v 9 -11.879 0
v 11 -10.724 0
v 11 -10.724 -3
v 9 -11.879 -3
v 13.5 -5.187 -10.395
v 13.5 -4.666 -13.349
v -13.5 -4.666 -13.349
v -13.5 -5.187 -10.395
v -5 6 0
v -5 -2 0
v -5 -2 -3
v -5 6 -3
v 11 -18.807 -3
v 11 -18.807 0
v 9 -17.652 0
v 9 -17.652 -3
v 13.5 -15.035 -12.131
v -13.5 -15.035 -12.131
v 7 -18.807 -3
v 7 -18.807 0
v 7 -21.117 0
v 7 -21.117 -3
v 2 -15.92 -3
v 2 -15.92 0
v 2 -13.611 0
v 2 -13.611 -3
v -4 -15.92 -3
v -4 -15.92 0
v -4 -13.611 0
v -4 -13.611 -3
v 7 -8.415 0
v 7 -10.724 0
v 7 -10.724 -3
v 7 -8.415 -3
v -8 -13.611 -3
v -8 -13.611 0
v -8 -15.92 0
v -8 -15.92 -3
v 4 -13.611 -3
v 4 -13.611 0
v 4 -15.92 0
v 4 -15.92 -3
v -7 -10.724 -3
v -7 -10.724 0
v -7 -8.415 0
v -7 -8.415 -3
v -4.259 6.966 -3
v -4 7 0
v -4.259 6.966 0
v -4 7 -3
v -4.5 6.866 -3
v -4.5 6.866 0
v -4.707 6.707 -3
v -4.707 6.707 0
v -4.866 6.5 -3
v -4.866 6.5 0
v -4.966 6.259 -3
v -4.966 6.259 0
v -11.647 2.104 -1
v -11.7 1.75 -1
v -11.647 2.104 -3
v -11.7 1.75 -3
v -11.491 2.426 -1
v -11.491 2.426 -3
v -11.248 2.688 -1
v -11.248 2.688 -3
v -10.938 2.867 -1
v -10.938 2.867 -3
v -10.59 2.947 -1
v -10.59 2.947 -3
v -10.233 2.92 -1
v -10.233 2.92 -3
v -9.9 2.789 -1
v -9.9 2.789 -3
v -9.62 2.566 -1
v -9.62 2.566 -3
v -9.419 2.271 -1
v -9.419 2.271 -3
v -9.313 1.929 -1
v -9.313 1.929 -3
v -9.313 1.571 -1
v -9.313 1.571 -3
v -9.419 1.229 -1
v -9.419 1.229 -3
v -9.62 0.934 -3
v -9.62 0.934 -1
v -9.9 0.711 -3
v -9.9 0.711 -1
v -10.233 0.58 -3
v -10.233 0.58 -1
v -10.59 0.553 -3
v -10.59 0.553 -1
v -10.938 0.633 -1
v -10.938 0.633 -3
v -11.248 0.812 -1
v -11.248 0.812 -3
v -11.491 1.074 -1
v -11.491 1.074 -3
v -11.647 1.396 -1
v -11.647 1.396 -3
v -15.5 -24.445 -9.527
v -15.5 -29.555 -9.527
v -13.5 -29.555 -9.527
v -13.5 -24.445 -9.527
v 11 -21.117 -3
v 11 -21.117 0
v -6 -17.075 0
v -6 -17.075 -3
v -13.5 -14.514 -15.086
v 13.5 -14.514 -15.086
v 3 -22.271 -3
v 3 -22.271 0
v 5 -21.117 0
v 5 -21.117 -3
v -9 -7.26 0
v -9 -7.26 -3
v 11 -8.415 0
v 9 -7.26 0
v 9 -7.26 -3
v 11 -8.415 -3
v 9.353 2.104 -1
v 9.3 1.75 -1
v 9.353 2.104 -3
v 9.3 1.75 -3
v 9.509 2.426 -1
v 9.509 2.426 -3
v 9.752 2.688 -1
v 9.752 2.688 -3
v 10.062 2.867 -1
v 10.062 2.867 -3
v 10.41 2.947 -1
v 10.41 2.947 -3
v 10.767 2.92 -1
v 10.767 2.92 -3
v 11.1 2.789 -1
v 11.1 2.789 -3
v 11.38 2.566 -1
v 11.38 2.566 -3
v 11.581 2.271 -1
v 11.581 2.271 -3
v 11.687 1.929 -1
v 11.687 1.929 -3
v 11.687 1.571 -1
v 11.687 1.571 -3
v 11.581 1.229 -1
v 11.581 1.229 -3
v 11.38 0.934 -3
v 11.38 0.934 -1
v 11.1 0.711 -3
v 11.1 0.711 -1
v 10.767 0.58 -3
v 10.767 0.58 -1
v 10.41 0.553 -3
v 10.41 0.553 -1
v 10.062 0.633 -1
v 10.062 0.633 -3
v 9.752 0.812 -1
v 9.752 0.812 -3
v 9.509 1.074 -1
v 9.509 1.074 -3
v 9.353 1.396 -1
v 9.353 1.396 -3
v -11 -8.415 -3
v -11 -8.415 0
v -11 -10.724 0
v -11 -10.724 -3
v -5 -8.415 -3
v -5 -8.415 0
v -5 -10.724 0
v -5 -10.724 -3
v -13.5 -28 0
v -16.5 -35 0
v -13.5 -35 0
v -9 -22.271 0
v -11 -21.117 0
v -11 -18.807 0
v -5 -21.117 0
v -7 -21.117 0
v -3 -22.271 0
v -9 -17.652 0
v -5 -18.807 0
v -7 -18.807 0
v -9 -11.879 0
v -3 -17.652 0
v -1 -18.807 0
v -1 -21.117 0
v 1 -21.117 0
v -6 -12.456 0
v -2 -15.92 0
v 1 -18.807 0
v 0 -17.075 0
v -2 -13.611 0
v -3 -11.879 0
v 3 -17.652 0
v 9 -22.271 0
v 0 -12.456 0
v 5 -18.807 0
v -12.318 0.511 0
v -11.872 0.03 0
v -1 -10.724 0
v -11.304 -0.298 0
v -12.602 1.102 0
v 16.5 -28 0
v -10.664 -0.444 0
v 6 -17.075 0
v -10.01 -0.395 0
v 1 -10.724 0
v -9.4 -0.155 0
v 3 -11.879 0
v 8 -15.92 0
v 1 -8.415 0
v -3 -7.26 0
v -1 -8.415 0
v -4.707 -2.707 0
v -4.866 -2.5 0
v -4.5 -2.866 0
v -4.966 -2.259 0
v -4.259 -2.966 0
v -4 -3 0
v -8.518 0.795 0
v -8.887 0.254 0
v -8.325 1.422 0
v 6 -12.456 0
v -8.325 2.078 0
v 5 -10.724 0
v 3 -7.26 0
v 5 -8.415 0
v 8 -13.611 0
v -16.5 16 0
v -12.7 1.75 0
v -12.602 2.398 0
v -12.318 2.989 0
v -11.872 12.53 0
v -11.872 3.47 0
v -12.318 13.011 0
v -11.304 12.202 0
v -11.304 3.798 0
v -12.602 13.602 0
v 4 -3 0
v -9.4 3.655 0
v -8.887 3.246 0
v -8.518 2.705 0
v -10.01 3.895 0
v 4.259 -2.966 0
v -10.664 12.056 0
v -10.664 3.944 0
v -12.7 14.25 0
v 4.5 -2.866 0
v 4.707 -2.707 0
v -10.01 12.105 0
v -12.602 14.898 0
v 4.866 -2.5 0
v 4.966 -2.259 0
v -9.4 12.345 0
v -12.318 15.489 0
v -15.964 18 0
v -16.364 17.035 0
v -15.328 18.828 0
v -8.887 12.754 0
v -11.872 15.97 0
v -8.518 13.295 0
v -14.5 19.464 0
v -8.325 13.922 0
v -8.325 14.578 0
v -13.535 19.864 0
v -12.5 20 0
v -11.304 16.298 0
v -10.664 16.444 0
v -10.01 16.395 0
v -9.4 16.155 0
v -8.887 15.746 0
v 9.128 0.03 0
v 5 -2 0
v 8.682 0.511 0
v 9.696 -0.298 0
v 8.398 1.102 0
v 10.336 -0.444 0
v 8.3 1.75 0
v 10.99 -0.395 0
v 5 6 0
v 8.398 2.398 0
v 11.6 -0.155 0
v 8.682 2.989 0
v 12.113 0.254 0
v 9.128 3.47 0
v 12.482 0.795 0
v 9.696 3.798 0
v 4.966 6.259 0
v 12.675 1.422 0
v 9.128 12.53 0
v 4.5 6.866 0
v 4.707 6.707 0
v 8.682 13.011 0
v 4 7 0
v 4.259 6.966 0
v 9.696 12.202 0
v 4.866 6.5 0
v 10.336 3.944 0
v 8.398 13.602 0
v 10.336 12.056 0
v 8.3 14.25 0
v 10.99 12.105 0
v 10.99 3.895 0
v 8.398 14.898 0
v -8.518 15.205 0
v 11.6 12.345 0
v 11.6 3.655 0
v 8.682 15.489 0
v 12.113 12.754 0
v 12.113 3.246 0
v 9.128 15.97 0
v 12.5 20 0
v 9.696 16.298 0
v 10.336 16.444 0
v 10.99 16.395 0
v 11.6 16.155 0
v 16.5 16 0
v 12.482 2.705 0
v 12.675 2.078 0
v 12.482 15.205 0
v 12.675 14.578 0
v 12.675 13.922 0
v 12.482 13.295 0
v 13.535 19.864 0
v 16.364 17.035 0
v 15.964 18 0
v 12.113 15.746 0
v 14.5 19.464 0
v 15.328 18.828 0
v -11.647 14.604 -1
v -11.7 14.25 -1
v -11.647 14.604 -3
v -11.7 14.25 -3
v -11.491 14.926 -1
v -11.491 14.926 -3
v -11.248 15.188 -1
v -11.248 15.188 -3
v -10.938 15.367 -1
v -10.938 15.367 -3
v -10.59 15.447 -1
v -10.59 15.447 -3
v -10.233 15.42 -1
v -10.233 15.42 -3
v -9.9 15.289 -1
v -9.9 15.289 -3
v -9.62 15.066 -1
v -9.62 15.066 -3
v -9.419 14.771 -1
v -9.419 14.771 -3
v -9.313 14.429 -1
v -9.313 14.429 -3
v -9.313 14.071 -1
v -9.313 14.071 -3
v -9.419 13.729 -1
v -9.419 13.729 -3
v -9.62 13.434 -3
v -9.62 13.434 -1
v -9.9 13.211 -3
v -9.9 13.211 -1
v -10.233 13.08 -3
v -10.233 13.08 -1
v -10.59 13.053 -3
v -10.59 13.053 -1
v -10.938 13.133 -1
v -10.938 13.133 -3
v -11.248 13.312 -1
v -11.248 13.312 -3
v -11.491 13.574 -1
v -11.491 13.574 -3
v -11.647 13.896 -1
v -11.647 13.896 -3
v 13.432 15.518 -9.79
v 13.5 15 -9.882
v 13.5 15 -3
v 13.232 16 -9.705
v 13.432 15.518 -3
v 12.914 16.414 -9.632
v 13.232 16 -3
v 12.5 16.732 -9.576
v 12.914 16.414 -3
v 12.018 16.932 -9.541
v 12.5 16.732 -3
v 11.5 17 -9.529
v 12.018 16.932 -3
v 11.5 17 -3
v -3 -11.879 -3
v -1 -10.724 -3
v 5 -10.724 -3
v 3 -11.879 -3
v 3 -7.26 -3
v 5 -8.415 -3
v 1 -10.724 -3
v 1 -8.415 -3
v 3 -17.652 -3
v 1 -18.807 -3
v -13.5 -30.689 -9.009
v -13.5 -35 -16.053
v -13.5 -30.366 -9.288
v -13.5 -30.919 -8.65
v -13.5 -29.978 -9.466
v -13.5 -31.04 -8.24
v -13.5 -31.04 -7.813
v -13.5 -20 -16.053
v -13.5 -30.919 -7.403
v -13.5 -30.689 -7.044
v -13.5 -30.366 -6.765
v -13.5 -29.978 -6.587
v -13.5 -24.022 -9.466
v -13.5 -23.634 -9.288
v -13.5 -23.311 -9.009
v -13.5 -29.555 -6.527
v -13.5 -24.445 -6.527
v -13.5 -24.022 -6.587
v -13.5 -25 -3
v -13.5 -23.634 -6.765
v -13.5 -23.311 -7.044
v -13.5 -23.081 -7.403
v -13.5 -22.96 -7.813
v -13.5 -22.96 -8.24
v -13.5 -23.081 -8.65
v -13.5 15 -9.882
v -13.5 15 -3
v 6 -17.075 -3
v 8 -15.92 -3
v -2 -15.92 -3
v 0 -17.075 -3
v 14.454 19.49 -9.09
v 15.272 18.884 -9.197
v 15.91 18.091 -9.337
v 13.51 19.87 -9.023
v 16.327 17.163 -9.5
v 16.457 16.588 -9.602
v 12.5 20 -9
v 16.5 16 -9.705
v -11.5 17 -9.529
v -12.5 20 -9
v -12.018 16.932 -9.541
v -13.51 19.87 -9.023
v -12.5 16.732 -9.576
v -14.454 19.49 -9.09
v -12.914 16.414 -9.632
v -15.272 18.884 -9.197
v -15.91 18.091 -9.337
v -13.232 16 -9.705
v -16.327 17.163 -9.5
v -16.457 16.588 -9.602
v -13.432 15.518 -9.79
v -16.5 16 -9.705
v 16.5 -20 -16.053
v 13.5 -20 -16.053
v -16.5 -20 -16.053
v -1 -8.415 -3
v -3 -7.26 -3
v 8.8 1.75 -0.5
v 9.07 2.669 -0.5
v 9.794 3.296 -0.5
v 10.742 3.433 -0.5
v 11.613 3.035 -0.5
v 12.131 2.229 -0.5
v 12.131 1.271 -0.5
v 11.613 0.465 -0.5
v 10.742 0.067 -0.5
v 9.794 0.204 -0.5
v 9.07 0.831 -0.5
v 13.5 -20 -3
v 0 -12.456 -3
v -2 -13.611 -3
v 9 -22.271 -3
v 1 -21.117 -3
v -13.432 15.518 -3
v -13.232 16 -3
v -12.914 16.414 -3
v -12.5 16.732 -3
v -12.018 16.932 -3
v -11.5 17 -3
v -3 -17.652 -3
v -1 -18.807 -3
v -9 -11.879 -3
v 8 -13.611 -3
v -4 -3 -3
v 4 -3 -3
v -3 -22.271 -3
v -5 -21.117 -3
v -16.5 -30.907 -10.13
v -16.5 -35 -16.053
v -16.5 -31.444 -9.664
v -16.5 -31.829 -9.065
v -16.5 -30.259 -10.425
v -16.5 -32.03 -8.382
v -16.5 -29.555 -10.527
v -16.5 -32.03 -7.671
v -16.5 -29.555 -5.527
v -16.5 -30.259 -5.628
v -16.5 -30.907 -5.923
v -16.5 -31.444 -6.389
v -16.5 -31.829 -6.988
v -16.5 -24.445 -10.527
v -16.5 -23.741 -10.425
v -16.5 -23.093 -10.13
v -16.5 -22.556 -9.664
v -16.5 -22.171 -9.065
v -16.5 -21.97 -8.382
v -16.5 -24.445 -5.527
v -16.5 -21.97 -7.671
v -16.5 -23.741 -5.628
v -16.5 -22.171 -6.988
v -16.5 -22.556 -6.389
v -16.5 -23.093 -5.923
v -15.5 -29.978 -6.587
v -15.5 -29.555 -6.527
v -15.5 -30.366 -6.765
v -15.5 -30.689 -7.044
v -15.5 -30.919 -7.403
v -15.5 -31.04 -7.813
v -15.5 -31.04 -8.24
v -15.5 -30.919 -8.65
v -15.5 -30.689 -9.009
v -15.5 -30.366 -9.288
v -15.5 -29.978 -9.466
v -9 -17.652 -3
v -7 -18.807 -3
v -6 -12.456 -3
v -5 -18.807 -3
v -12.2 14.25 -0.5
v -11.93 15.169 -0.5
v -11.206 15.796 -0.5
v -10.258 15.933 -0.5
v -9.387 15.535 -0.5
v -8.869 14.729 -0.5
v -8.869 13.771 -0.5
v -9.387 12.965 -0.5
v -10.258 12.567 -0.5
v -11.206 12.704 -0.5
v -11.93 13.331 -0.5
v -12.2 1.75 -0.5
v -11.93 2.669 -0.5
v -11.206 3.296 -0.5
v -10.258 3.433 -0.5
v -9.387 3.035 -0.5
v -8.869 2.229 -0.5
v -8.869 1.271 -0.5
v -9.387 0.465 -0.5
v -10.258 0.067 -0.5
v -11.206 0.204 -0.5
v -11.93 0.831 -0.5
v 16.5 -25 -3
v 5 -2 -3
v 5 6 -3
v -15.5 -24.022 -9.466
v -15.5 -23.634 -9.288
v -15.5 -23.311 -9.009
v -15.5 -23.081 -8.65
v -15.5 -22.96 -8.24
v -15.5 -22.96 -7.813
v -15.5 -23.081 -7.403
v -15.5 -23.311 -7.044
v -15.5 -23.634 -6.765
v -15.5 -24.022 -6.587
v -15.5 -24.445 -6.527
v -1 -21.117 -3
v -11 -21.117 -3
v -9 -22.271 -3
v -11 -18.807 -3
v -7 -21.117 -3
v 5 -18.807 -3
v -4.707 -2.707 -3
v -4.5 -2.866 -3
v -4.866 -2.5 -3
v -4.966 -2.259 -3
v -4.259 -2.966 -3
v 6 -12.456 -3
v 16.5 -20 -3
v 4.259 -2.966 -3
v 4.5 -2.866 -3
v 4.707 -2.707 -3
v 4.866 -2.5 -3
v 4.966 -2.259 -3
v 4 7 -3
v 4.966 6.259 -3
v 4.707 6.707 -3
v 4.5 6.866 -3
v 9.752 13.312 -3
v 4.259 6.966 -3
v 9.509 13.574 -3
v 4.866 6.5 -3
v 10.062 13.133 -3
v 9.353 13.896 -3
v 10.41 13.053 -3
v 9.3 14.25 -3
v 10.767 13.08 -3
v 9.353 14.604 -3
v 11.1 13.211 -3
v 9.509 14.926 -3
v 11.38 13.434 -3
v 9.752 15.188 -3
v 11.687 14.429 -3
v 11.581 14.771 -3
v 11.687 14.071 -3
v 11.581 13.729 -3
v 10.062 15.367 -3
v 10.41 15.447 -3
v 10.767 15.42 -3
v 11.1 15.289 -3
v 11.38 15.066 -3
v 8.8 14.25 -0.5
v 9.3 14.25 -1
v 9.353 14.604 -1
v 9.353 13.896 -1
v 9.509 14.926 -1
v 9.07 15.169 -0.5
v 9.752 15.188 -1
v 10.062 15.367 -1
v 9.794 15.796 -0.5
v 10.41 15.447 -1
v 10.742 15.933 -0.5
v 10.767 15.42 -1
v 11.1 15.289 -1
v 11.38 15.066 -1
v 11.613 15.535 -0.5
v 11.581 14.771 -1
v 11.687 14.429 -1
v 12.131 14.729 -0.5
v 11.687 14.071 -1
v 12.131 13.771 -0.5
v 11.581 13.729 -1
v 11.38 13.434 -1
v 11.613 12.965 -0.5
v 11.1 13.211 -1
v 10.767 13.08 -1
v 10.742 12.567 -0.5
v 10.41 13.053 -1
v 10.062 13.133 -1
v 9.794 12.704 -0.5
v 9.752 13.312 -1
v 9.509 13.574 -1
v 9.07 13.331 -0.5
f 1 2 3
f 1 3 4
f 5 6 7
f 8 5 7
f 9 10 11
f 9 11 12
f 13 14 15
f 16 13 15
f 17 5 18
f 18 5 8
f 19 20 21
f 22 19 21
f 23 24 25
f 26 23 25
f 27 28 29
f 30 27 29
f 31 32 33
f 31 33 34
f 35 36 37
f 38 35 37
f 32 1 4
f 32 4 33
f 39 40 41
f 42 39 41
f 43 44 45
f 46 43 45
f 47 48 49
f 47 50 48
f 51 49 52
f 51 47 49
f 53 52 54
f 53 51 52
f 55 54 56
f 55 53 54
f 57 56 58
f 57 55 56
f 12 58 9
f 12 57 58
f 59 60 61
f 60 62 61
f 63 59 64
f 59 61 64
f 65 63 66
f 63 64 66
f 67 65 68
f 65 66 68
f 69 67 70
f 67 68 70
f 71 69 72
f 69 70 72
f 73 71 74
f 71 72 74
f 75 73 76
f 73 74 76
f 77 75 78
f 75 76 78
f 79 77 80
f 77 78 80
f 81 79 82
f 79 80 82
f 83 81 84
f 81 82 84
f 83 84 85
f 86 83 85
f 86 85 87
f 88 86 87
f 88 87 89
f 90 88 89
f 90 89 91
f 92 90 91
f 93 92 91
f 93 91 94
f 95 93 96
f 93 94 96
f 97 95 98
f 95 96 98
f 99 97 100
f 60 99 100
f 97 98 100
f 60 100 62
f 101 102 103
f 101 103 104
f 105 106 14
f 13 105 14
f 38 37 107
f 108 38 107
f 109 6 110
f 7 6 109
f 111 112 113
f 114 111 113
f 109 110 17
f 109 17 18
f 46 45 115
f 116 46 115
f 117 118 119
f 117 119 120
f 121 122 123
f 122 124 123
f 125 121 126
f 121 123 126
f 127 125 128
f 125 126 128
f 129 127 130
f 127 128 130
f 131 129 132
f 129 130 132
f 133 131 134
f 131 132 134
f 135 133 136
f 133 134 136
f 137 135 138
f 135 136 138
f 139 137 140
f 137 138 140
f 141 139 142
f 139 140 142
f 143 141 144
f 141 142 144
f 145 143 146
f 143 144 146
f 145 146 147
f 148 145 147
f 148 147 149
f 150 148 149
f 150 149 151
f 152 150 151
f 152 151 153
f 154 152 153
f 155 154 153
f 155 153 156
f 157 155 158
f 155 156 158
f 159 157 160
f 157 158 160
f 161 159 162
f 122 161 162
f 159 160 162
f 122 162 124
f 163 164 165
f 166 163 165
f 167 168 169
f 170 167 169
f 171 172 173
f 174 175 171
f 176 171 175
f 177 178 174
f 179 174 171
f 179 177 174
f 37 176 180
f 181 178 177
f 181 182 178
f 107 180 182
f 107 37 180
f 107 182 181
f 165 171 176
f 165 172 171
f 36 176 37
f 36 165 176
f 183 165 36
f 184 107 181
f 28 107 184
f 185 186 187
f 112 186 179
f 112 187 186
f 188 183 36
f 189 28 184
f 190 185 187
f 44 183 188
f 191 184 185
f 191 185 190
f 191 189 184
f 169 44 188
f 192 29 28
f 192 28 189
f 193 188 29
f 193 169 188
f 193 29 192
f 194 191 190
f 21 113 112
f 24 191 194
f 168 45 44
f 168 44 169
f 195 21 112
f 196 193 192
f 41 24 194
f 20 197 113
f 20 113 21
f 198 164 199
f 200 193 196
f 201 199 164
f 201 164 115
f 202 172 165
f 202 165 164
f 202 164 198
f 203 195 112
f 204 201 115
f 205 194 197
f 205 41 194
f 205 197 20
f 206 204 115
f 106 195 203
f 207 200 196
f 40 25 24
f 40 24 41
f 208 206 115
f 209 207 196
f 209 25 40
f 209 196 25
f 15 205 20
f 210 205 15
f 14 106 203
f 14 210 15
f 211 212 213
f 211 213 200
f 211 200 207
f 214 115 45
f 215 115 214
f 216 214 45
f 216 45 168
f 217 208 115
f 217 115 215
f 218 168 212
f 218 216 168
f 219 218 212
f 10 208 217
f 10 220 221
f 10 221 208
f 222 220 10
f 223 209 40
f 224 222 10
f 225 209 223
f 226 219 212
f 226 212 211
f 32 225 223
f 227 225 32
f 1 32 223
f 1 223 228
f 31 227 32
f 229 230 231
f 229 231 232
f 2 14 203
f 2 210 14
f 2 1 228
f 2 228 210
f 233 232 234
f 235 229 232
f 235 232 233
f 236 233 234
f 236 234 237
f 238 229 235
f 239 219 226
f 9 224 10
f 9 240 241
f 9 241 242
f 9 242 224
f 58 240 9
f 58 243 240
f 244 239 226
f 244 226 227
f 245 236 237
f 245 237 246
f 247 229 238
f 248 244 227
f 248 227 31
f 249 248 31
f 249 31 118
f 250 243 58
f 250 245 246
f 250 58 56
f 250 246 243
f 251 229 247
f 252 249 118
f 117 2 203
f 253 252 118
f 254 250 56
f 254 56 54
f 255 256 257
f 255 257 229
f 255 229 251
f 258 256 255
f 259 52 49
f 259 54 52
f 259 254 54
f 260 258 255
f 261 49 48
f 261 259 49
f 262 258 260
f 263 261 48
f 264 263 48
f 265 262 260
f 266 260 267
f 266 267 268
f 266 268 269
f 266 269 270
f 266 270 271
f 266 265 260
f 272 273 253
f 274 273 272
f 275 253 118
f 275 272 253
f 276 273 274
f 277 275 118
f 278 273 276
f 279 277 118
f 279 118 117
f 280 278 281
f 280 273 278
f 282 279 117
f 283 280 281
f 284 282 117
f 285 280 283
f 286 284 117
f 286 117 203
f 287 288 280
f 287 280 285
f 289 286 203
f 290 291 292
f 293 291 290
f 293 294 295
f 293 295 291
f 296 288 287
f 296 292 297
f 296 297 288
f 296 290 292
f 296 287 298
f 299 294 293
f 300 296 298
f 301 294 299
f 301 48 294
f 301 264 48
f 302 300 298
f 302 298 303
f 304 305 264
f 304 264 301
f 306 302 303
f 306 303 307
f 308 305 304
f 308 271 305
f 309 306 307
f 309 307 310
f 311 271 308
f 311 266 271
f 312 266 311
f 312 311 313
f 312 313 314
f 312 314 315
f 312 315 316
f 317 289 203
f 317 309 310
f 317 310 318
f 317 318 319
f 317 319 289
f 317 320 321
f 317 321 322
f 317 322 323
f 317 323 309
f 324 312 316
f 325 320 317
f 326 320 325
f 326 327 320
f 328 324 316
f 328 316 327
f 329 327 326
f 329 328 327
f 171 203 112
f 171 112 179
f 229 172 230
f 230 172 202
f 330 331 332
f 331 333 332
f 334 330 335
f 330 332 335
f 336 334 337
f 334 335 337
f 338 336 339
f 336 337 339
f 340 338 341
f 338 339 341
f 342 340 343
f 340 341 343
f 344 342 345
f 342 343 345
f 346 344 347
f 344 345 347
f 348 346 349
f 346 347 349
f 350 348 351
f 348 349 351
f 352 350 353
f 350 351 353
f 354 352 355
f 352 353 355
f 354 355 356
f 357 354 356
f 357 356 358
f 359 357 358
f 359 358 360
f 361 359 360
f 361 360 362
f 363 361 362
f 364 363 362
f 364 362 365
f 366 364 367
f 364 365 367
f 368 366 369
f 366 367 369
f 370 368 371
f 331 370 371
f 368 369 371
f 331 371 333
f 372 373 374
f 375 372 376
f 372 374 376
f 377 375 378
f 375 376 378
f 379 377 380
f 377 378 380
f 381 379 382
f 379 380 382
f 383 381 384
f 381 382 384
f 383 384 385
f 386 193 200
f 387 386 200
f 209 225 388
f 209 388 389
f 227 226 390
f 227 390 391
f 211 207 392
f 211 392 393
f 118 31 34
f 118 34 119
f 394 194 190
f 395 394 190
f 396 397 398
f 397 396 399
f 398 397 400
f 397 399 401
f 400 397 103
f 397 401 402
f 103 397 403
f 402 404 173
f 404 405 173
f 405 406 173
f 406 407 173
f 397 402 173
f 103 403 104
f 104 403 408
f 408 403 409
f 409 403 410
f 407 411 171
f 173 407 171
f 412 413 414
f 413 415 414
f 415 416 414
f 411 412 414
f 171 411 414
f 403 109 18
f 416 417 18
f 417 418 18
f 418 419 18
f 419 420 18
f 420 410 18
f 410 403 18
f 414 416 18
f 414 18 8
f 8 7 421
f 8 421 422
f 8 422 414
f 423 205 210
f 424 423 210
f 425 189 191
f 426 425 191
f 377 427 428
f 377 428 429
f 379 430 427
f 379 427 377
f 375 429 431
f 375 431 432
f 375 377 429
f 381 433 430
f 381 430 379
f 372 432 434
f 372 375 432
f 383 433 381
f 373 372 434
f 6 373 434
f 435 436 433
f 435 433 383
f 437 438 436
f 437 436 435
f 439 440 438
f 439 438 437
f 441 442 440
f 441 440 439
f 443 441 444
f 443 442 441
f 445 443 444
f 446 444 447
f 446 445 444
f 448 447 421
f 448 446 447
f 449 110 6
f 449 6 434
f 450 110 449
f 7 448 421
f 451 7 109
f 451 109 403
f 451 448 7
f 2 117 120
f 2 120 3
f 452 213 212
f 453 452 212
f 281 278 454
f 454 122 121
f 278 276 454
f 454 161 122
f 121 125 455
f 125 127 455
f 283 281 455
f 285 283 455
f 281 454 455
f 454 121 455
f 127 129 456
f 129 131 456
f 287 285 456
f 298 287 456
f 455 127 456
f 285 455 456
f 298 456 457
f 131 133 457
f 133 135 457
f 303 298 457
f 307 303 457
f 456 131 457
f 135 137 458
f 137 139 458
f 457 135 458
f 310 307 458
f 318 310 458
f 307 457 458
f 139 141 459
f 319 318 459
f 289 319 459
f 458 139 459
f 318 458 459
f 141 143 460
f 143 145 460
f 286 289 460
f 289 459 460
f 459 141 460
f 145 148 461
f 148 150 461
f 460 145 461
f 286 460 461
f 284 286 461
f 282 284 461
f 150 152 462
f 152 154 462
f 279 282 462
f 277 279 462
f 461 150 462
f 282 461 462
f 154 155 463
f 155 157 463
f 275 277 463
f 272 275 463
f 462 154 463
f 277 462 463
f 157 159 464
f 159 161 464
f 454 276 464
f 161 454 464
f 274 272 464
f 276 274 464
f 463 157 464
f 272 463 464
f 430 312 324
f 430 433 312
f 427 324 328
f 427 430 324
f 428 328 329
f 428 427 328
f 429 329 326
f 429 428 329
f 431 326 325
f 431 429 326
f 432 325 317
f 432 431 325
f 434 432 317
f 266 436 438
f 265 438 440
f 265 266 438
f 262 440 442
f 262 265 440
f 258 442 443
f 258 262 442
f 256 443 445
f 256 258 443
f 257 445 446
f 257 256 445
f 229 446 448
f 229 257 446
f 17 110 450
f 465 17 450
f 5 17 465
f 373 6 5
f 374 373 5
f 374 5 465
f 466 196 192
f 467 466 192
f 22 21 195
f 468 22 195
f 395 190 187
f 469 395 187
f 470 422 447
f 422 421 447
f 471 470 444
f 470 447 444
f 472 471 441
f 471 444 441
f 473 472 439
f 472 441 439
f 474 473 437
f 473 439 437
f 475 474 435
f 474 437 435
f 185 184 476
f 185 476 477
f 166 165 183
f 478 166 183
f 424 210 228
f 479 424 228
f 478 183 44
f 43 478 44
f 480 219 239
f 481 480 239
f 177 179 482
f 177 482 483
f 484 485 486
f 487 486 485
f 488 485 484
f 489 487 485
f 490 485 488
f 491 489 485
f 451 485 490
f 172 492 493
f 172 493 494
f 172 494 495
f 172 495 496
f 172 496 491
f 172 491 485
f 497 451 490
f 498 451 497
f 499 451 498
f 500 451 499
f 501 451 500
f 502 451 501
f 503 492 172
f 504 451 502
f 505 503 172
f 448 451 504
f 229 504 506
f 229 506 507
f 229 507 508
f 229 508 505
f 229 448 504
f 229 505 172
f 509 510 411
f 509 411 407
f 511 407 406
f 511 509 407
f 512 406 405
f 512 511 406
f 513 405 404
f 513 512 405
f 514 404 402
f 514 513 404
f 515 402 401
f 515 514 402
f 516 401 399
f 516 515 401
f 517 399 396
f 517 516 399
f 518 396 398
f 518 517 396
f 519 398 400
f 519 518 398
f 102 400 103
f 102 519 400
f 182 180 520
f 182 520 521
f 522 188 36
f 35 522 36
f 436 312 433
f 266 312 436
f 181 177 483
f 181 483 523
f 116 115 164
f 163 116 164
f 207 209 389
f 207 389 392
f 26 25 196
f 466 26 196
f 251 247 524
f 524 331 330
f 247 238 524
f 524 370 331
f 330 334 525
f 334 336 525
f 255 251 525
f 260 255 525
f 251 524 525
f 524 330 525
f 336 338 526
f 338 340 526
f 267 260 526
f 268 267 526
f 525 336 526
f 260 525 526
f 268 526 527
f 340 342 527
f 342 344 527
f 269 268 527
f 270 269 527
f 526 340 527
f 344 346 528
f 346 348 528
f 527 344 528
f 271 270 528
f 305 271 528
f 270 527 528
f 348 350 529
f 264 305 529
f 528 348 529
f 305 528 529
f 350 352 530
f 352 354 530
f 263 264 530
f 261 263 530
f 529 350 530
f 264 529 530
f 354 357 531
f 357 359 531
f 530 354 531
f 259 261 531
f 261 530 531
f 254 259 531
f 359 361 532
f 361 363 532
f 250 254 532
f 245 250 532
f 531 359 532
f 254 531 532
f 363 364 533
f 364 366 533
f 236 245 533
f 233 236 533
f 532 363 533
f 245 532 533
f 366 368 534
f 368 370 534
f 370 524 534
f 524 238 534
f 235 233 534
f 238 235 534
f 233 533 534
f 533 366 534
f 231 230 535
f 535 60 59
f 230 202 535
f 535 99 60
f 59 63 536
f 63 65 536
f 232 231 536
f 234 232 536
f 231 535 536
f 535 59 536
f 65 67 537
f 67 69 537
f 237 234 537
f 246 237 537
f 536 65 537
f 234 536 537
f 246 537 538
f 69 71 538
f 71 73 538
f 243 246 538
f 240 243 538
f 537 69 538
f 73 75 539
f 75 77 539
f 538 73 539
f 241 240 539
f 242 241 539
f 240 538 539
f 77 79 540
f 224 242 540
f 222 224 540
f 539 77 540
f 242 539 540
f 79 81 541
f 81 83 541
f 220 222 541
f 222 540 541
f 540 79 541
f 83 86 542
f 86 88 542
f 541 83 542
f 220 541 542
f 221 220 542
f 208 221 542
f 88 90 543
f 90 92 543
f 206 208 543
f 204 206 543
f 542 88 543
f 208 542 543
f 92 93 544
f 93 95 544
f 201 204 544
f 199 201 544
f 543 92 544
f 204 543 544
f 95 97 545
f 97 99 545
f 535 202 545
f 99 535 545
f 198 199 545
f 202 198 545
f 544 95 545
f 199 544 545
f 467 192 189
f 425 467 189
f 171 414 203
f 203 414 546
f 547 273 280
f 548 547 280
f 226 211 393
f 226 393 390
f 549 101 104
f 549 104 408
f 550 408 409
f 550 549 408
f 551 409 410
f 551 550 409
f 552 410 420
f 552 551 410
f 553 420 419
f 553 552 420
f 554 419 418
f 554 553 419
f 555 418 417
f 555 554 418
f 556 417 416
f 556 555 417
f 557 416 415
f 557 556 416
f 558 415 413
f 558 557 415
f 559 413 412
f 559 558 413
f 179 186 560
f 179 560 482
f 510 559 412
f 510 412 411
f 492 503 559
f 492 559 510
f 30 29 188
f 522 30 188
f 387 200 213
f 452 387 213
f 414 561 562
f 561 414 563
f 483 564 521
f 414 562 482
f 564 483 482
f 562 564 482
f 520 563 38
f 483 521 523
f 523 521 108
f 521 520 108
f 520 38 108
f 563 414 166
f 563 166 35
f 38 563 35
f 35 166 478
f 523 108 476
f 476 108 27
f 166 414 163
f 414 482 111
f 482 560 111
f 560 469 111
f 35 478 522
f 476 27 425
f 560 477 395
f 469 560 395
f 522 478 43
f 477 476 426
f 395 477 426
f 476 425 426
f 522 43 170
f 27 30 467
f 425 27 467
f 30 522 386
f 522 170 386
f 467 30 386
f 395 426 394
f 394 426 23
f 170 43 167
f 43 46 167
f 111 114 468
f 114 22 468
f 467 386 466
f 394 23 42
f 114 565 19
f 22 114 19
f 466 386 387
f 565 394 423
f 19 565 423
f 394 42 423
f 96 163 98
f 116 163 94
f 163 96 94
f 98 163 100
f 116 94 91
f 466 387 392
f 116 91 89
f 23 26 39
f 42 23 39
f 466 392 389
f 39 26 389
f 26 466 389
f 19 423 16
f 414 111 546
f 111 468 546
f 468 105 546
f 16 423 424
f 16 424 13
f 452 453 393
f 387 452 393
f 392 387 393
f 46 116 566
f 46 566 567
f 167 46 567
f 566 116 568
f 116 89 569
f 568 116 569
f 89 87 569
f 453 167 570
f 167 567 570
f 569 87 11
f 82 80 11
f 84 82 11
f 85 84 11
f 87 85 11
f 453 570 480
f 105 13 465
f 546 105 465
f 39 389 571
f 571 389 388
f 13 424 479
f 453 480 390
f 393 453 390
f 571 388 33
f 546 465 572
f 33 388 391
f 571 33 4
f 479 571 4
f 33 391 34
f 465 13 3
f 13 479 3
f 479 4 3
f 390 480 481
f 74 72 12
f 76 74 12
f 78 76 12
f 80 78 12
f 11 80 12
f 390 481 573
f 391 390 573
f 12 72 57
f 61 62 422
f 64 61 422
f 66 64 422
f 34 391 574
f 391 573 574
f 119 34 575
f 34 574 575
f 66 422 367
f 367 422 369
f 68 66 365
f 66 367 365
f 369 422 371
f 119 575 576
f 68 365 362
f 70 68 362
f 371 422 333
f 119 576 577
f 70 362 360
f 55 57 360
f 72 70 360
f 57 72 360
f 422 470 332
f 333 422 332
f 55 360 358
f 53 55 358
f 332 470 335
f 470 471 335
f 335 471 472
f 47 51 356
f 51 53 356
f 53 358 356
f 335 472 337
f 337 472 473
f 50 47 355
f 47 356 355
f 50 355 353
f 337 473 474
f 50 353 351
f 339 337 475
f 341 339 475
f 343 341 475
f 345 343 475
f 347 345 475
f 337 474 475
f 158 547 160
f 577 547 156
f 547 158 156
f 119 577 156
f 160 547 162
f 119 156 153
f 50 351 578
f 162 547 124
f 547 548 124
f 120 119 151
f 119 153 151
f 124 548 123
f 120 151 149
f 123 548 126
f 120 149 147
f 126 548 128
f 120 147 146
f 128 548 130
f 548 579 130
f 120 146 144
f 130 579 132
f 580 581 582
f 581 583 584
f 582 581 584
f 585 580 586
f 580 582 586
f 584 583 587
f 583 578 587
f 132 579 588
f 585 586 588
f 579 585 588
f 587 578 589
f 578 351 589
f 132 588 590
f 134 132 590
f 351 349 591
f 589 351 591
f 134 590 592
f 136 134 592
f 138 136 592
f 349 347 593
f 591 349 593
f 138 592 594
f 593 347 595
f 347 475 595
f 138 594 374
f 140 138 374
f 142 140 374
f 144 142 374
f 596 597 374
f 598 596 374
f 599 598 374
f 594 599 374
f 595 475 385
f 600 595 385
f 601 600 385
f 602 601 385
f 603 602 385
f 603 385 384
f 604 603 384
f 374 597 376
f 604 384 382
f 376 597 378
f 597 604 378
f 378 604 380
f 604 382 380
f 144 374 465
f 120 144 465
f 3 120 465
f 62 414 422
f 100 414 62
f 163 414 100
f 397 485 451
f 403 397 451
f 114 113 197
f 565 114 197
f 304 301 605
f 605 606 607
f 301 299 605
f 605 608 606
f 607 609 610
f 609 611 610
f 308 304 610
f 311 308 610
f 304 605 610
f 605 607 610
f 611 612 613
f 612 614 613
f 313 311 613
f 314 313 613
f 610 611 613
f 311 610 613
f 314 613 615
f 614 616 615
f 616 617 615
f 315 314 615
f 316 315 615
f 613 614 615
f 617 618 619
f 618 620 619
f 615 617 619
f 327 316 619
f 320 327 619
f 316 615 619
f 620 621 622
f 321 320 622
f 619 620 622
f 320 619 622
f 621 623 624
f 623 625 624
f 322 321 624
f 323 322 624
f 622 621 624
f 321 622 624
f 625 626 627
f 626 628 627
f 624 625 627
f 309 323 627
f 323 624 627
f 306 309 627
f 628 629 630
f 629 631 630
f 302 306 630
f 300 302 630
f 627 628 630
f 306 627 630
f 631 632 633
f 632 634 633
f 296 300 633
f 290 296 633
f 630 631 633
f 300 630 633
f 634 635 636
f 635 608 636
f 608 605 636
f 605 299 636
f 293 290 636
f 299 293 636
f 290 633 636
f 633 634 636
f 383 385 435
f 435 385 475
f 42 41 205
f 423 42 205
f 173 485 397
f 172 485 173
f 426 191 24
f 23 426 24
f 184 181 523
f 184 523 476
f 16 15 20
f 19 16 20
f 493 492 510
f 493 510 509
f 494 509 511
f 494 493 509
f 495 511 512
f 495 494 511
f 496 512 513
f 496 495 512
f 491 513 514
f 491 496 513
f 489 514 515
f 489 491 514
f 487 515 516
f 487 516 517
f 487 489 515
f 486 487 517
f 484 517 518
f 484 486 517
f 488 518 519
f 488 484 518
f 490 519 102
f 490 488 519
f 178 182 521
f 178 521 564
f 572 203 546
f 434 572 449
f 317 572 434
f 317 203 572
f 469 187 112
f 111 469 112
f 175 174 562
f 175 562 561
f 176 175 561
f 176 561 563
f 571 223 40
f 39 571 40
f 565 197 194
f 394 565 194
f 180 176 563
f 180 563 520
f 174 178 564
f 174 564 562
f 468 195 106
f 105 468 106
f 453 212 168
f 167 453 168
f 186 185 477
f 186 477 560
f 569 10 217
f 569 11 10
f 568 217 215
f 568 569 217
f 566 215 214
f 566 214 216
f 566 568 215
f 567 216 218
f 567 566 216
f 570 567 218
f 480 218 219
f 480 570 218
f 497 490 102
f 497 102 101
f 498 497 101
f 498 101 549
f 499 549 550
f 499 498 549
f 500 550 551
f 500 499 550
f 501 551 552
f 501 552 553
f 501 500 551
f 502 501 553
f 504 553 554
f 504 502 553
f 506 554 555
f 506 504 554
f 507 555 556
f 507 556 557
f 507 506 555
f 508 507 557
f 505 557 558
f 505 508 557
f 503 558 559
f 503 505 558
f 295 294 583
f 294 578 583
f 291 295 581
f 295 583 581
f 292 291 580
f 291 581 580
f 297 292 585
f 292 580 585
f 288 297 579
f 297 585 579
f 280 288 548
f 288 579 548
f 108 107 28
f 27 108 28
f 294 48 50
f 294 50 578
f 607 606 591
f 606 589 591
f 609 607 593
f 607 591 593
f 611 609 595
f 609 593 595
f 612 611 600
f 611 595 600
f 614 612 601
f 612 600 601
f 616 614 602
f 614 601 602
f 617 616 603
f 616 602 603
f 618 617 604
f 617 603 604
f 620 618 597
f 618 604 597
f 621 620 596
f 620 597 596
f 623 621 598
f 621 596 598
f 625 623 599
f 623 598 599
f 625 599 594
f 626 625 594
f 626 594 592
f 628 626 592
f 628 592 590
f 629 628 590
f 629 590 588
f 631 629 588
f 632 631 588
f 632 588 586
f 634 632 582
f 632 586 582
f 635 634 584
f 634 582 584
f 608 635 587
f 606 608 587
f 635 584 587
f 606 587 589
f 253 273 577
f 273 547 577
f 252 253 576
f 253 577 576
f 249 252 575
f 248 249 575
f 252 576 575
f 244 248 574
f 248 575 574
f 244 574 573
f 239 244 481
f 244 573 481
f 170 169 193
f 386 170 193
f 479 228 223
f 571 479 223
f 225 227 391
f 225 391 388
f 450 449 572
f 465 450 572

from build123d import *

# Parameters (mm, degrees)
SKETCH1_W                                       = 33
SKETCH1_H                                       = 40
BOSS_EXTRUDE1_DEPTH                             = 3
SKETCH2_W                                       = 33
SKETCH2_H                                       = 40
SKETCH2_W_2                                     = 27
SKETCH2_H_2                                     = 34
BOSS_EXTRUDE2_DEPTH                             = 3
SKETCH3_W                                       = 10
SKETCH3_H                                       = 10
CUT_EXTRUDE1_DEPTH                              = 3
CSK_FOR_M2_FLAT_HEAD_MACHINE_SCREW1_D           = 2.4
CSK_FOR_M2_FLAT_HEAD_MACHINE_SCREW1_DEPTH       = 5
CSK_FOR_M2_FLAT_HEAD_MACHINE_SCREW1_CSINK_D     = 4.4
CSK_FOR_M2_FLAT_HEAD_MACHINE_SCREW1_CSINK_ANGLE = 90
CSK_FOR_M2_FLAT_HEAD_MACHINE_SCREW1_TIP         = 0.721032743
BOSS_EXTRUDE4_DEPTH                             = 3
FILLET1_R                                       = 1
BOSS_EXTRUDE5_REACH                             = 29.809
SKETCH15_W                                      = 27
SKETCH15_H                                      = 3
SKETCH16_W                                      = 27
SKETCH16_H                                      = 3
CUT_EXTRUDE6_DEPTH                              = 3
SKETCH18_W                                      = 27
SKETCH18_H                                      = 10
BOSS_EXTRUDE6_DEPTH                             = 3
FILLET2_R                                       = 4
FILLET3_R                                       = 2
SKETCH21_W                                      = 16.053079228
SKETCH21_H                                      = 15
BOSS_EXTRUDE7_DEPTH                             = 3
CUT_EXTRUDE10_DEPTH                             = 10
SKETCH23_W                                      = 30
SKETCH23_H                                      = 8
BOSS_EXTRUDE8_DEPTH                             = 3
CHAMFER5_SIZE                                   = 3
CHAMFER6_SIZE                                   = 1
CUT_EXTRUDE12_DEPTH                             = 10


with BuildPart() as part:
    # Sketch1 → Boss-Extrude1 (new body)
    with BuildSketch(Plane.XY):
        Rectangle(SKETCH1_W, SKETCH1_H)
    extrude(amount=-BOSS_EXTRUDE1_DEPTH)

    # Sketch2 → Boss-Extrude2 (add)
    with BuildSketch(Plane(origin=(0, 0, -3), x_dir=(-1, 0, 0), z_dir=(0, 0, -1))):
        Rectangle(SKETCH2_W, SKETCH2_H)
        Rectangle(SKETCH2_W_2, SKETCH2_H_2, mode=Mode.SUBTRACT)
    extrude(amount=BOSS_EXTRUDE2_DEPTH)

    # Sketch3 → Cut-Extrude1 (cut)
    with BuildSketch(Plane.XY):
        with Locations((0, 2)):
            Rectangle(SKETCH3_W, SKETCH3_H)
    extrude(amount=-CUT_EXTRUDE1_DEPTH, mode=Mode.SUBTRACT)

    # CSK for M2 Flat Head Machine Screw1
    with Locations(Plane.XY):
        with Locations((10.5, 1.75), (10.5, 14.25), (-10.5, 1.75), (-10.5, 14.25)):
            CounterSinkHole(CSK_FOR_M2_FLAT_HEAD_MACHINE_SCREW1_D / 2, CSK_FOR_M2_FLAT_HEAD_MACHINE_SCREW1_CSINK_D / 2, depth=CSK_FOR_M2_FLAT_HEAD_MACHINE_SCREW1_DEPTH, counter_sink_angle=CSK_FOR_M2_FLAT_HEAD_MACHINE_SCREW1_CSINK_ANGLE)
            with Locations((0, 0, -(CSK_FOR_M2_FLAT_HEAD_MACHINE_SCREW1_DEPTH + CSK_FOR_M2_FLAT_HEAD_MACHINE_SCREW1_TIP / 2))):  # 118° drill point
                Cone(0, CSK_FOR_M2_FLAT_HEAD_MACHINE_SCREW1_D / 2, CSK_FOR_M2_FLAT_HEAD_MACHINE_SCREW1_TIP, mode=Mode.SUBTRACT)

    # Sketch11 → Boss-Extrude4 (add)
    with BuildSketch(Plane.ZY.offset(16.5)):
        Polygon((-6, 20), (-9, 20), (-16.053079228, -20), (-6, -20), align=None)
    boss_extrude4 = extrude(amount=-BOSS_EXTRUDE4_DEPTH)

    # Mirror1: Boss-Extrude4 across plane
    add(boss_extrude4.mirror(Plane(origin=(0, 0, 0), x_dir=(0, 0, 1), z_dir=(1, 0, 0))))

    # Fillet1
    fillet1_edges = [part.edges().sort_by_distance(p)[0] for p in [
        (5, 7, -1.5),
        (5, -3, -1.5),
        (-5, -3, -1.5),
        (-5, 7, -1.5),
    ]]
    fillet(fillet1_edges, radius=FILLET1_R)

    # Boss-Extrude5: up to this face of the body (flat: up to its plane)
    boss_extrude5_end = Plane(part.part.faces().sort_by_distance((15, 0, -12.526539614))[0])
    # Sketch15 → Boss-Extrude5 (add, up to the picked face)
    with BuildSketch(Plane(origin=(0, 0, -6), x_dir=(-1, 0, 0), z_dir=(0, 0, -1)), mode=Mode.PRIVATE) as boss_extrude5_sk1:
        with Locations((0, 18.5)):
            Rectangle(SKETCH15_W, SKETCH15_H)
    boss_extrude5_tool1 = split(extrude(boss_extrude5_sk1.sketch, amount=BOSS_EXTRUDE5_REACH, mode=Mode.PRIVATE), bisect_by=boss_extrude5_end, keep=Keep.BOTH, mode=Mode.PRIVATE)
    add(boss_extrude5_tool1.solids().sort_by(Axis((0, 18.5, -6), (0, 0, -1)))[0])

    # Sketch16 → Cut-Extrude6 (cut)
    with BuildSketch(Plane.XZ.offset(20)):
        with Locations((0, -4.5)):
            Rectangle(SKETCH16_W, SKETCH16_H)
    extrude(amount=-CUT_EXTRUDE6_DEPTH, mode=Mode.SUBTRACT)

    # Sketch18 → Boss-Extrude6 (add)
    with BuildSketch(Plane(origin=(0, 2.142164437, -12.148818227), x_dir=(-1, 0, 0), z_dir=(0, 0.17364817766692342, -0.9848077530122092))):
        with Locations((0, -11.912958374)):
            Rectangle(SKETCH18_W, SKETCH18_H)
    extrude(amount=-BOSS_EXTRUDE6_DEPTH)

    # Fillet2
    fillet2_edges = [part.edges().sort_by_distance(p)[0] for p in [
        (-16.5, 20, -4.5),
        (16.5, 20, -4.5),
    ]]
    fillet(fillet2_edges, radius=FILLET2_R)

    # Fillet3
    fillet3_edges = [part.edges().sort_by_distance(p)[0] for p in [
        (-13.5, 17, -6.264490471),
        (13.5, 17, -6.264490471),
    ]]
    fillet(fillet3_edges, radius=FILLET3_R)

    # Sketch21 → Boss-Extrude7 (add)
    with BuildSketch(Plane.ZY.offset(16.5)):
        with Locations((-8.026539614, -27.5)):
            Rectangle(SKETCH21_W, SKETCH21_H)
    extrude(amount=-BOSS_EXTRUDE7_DEPTH)

    # Sketch22 → Cut-Extrude10 (cut)
    with BuildSketch(Plane.ZY.offset(16.5)):
        with BuildLine():
            Line((-9.526539614, -29.555), (-9.526539614, -24.445))
            ThreePointArc((-9.526539614, -24.445), (-8.026539614, -22.945), (-6.526539614, -24.445))
            Line((-6.526539614, -24.445), (-6.526539614, -29.555))
            ThreePointArc((-6.526539614, -29.555), (-8.026539614, -31.055), (-9.526539614, -29.555))
        make_face()
    extrude(amount=-CUT_EXTRUDE10_DEPTH, mode=Mode.SUBTRACT)

    # Sketch23 → Boss-Extrude8 (add)
    with BuildSketch(Plane.XY):
        with Locations((1.5, -24)):
            Rectangle(SKETCH23_W, SKETCH23_H)
    extrude(amount=-BOSS_EXTRUDE8_DEPTH)

    # Chamfer5
    chamfer5_edges = [part.edges().sort_by_distance(p)[0] for p in [
        (1.5, -28, -3),
    ]]
    chamfer(chamfer5_edges, length=CHAMFER5_SIZE - 0.0001)  # a hair under: the kernel refuses the full size

    # Chamfer6
    chamfer6_edges = [part.edges().sort_by_distance(p)[0] for p in [
        (-16.5, -31.055, -8.026539614),
        (-16.5, -27, -6.526539614),
        (-16.5, -22.945, -8.026539614),
        (-16.5, -27, -9.526539614),
    ]]
    chamfer(chamfer6_edges, length=CHAMFER6_SIZE)

    # Sketch25 → Cut-Extrude12 (cut)
    with BuildSketch(Plane.XY):
        Polygon((-1, -8.414816681), (-3, -7.260116142), (-5, -8.414816681), (-5, -10.724217758), (-3, -11.878918296), (-1, -10.724217758), align=None)
        Polygon((-7, -8.414816681), (-9, -7.260116142), (-11, -8.414816681), (-11, -10.724217758), (-9, -11.878918296), (-7, -10.724217758), align=None)
        Polygon((1, -10.724217758), (1, -8.414816681), (3, -7.260116142), (5, -8.414816681), (5, -10.724217758), (3, -11.878918296), align=None)
        Polygon((7, -10.724217758), (7, -8.414816681), (9, -7.260116142), (11, -8.414816681), (11, -10.724217758), (9, -11.878918296), align=None)
        Polygon((0, -12.456268565), (-2, -13.610969104), (-2, -15.92037018), (0, -17.075070719), (2, -15.92037018), (2, -13.610969104), align=None)
        Polygon((-6, -12.456268565), (-8, -13.610969104), (-8, -15.92037018), (-6, -17.075070719), (-4, -15.92037018), (-4, -13.610969104), align=None)
        Polygon((6, -12.456268565), (4, -13.610969104), (4, -15.92037018), (6, -17.075070719), (8, -15.92037018), (8, -13.610969104), align=None)
        Polygon((1, -21.116522603), (3, -22.271223141), (5, -21.116522603), (5, -18.807121526), (3, -17.652420988), (1, -18.807121526), align=None)
        Polygon((7, -21.116522603), (9, -22.271223141), (11, -21.116522603), (11, -18.807121526), (9, -17.652420988), (7, -18.807121526), align=None)
        Polygon((-1, -18.807121526), (-1, -21.116522603), (-3, -22.271223141), (-5, -21.116522603), (-5, -18.807121526), (-3, -17.652420988), align=None)
        Polygon((-7, -18.807121526), (-7, -21.116522603), (-9, -22.271223141), (-11, -21.116522603), (-11, -18.807121526), (-9, -17.652420988), align=None)
    extrude(amount=-CUT_EXTRUDE12_DEPTH, mode=Mode.SUBTRACT)


solid = part.part
